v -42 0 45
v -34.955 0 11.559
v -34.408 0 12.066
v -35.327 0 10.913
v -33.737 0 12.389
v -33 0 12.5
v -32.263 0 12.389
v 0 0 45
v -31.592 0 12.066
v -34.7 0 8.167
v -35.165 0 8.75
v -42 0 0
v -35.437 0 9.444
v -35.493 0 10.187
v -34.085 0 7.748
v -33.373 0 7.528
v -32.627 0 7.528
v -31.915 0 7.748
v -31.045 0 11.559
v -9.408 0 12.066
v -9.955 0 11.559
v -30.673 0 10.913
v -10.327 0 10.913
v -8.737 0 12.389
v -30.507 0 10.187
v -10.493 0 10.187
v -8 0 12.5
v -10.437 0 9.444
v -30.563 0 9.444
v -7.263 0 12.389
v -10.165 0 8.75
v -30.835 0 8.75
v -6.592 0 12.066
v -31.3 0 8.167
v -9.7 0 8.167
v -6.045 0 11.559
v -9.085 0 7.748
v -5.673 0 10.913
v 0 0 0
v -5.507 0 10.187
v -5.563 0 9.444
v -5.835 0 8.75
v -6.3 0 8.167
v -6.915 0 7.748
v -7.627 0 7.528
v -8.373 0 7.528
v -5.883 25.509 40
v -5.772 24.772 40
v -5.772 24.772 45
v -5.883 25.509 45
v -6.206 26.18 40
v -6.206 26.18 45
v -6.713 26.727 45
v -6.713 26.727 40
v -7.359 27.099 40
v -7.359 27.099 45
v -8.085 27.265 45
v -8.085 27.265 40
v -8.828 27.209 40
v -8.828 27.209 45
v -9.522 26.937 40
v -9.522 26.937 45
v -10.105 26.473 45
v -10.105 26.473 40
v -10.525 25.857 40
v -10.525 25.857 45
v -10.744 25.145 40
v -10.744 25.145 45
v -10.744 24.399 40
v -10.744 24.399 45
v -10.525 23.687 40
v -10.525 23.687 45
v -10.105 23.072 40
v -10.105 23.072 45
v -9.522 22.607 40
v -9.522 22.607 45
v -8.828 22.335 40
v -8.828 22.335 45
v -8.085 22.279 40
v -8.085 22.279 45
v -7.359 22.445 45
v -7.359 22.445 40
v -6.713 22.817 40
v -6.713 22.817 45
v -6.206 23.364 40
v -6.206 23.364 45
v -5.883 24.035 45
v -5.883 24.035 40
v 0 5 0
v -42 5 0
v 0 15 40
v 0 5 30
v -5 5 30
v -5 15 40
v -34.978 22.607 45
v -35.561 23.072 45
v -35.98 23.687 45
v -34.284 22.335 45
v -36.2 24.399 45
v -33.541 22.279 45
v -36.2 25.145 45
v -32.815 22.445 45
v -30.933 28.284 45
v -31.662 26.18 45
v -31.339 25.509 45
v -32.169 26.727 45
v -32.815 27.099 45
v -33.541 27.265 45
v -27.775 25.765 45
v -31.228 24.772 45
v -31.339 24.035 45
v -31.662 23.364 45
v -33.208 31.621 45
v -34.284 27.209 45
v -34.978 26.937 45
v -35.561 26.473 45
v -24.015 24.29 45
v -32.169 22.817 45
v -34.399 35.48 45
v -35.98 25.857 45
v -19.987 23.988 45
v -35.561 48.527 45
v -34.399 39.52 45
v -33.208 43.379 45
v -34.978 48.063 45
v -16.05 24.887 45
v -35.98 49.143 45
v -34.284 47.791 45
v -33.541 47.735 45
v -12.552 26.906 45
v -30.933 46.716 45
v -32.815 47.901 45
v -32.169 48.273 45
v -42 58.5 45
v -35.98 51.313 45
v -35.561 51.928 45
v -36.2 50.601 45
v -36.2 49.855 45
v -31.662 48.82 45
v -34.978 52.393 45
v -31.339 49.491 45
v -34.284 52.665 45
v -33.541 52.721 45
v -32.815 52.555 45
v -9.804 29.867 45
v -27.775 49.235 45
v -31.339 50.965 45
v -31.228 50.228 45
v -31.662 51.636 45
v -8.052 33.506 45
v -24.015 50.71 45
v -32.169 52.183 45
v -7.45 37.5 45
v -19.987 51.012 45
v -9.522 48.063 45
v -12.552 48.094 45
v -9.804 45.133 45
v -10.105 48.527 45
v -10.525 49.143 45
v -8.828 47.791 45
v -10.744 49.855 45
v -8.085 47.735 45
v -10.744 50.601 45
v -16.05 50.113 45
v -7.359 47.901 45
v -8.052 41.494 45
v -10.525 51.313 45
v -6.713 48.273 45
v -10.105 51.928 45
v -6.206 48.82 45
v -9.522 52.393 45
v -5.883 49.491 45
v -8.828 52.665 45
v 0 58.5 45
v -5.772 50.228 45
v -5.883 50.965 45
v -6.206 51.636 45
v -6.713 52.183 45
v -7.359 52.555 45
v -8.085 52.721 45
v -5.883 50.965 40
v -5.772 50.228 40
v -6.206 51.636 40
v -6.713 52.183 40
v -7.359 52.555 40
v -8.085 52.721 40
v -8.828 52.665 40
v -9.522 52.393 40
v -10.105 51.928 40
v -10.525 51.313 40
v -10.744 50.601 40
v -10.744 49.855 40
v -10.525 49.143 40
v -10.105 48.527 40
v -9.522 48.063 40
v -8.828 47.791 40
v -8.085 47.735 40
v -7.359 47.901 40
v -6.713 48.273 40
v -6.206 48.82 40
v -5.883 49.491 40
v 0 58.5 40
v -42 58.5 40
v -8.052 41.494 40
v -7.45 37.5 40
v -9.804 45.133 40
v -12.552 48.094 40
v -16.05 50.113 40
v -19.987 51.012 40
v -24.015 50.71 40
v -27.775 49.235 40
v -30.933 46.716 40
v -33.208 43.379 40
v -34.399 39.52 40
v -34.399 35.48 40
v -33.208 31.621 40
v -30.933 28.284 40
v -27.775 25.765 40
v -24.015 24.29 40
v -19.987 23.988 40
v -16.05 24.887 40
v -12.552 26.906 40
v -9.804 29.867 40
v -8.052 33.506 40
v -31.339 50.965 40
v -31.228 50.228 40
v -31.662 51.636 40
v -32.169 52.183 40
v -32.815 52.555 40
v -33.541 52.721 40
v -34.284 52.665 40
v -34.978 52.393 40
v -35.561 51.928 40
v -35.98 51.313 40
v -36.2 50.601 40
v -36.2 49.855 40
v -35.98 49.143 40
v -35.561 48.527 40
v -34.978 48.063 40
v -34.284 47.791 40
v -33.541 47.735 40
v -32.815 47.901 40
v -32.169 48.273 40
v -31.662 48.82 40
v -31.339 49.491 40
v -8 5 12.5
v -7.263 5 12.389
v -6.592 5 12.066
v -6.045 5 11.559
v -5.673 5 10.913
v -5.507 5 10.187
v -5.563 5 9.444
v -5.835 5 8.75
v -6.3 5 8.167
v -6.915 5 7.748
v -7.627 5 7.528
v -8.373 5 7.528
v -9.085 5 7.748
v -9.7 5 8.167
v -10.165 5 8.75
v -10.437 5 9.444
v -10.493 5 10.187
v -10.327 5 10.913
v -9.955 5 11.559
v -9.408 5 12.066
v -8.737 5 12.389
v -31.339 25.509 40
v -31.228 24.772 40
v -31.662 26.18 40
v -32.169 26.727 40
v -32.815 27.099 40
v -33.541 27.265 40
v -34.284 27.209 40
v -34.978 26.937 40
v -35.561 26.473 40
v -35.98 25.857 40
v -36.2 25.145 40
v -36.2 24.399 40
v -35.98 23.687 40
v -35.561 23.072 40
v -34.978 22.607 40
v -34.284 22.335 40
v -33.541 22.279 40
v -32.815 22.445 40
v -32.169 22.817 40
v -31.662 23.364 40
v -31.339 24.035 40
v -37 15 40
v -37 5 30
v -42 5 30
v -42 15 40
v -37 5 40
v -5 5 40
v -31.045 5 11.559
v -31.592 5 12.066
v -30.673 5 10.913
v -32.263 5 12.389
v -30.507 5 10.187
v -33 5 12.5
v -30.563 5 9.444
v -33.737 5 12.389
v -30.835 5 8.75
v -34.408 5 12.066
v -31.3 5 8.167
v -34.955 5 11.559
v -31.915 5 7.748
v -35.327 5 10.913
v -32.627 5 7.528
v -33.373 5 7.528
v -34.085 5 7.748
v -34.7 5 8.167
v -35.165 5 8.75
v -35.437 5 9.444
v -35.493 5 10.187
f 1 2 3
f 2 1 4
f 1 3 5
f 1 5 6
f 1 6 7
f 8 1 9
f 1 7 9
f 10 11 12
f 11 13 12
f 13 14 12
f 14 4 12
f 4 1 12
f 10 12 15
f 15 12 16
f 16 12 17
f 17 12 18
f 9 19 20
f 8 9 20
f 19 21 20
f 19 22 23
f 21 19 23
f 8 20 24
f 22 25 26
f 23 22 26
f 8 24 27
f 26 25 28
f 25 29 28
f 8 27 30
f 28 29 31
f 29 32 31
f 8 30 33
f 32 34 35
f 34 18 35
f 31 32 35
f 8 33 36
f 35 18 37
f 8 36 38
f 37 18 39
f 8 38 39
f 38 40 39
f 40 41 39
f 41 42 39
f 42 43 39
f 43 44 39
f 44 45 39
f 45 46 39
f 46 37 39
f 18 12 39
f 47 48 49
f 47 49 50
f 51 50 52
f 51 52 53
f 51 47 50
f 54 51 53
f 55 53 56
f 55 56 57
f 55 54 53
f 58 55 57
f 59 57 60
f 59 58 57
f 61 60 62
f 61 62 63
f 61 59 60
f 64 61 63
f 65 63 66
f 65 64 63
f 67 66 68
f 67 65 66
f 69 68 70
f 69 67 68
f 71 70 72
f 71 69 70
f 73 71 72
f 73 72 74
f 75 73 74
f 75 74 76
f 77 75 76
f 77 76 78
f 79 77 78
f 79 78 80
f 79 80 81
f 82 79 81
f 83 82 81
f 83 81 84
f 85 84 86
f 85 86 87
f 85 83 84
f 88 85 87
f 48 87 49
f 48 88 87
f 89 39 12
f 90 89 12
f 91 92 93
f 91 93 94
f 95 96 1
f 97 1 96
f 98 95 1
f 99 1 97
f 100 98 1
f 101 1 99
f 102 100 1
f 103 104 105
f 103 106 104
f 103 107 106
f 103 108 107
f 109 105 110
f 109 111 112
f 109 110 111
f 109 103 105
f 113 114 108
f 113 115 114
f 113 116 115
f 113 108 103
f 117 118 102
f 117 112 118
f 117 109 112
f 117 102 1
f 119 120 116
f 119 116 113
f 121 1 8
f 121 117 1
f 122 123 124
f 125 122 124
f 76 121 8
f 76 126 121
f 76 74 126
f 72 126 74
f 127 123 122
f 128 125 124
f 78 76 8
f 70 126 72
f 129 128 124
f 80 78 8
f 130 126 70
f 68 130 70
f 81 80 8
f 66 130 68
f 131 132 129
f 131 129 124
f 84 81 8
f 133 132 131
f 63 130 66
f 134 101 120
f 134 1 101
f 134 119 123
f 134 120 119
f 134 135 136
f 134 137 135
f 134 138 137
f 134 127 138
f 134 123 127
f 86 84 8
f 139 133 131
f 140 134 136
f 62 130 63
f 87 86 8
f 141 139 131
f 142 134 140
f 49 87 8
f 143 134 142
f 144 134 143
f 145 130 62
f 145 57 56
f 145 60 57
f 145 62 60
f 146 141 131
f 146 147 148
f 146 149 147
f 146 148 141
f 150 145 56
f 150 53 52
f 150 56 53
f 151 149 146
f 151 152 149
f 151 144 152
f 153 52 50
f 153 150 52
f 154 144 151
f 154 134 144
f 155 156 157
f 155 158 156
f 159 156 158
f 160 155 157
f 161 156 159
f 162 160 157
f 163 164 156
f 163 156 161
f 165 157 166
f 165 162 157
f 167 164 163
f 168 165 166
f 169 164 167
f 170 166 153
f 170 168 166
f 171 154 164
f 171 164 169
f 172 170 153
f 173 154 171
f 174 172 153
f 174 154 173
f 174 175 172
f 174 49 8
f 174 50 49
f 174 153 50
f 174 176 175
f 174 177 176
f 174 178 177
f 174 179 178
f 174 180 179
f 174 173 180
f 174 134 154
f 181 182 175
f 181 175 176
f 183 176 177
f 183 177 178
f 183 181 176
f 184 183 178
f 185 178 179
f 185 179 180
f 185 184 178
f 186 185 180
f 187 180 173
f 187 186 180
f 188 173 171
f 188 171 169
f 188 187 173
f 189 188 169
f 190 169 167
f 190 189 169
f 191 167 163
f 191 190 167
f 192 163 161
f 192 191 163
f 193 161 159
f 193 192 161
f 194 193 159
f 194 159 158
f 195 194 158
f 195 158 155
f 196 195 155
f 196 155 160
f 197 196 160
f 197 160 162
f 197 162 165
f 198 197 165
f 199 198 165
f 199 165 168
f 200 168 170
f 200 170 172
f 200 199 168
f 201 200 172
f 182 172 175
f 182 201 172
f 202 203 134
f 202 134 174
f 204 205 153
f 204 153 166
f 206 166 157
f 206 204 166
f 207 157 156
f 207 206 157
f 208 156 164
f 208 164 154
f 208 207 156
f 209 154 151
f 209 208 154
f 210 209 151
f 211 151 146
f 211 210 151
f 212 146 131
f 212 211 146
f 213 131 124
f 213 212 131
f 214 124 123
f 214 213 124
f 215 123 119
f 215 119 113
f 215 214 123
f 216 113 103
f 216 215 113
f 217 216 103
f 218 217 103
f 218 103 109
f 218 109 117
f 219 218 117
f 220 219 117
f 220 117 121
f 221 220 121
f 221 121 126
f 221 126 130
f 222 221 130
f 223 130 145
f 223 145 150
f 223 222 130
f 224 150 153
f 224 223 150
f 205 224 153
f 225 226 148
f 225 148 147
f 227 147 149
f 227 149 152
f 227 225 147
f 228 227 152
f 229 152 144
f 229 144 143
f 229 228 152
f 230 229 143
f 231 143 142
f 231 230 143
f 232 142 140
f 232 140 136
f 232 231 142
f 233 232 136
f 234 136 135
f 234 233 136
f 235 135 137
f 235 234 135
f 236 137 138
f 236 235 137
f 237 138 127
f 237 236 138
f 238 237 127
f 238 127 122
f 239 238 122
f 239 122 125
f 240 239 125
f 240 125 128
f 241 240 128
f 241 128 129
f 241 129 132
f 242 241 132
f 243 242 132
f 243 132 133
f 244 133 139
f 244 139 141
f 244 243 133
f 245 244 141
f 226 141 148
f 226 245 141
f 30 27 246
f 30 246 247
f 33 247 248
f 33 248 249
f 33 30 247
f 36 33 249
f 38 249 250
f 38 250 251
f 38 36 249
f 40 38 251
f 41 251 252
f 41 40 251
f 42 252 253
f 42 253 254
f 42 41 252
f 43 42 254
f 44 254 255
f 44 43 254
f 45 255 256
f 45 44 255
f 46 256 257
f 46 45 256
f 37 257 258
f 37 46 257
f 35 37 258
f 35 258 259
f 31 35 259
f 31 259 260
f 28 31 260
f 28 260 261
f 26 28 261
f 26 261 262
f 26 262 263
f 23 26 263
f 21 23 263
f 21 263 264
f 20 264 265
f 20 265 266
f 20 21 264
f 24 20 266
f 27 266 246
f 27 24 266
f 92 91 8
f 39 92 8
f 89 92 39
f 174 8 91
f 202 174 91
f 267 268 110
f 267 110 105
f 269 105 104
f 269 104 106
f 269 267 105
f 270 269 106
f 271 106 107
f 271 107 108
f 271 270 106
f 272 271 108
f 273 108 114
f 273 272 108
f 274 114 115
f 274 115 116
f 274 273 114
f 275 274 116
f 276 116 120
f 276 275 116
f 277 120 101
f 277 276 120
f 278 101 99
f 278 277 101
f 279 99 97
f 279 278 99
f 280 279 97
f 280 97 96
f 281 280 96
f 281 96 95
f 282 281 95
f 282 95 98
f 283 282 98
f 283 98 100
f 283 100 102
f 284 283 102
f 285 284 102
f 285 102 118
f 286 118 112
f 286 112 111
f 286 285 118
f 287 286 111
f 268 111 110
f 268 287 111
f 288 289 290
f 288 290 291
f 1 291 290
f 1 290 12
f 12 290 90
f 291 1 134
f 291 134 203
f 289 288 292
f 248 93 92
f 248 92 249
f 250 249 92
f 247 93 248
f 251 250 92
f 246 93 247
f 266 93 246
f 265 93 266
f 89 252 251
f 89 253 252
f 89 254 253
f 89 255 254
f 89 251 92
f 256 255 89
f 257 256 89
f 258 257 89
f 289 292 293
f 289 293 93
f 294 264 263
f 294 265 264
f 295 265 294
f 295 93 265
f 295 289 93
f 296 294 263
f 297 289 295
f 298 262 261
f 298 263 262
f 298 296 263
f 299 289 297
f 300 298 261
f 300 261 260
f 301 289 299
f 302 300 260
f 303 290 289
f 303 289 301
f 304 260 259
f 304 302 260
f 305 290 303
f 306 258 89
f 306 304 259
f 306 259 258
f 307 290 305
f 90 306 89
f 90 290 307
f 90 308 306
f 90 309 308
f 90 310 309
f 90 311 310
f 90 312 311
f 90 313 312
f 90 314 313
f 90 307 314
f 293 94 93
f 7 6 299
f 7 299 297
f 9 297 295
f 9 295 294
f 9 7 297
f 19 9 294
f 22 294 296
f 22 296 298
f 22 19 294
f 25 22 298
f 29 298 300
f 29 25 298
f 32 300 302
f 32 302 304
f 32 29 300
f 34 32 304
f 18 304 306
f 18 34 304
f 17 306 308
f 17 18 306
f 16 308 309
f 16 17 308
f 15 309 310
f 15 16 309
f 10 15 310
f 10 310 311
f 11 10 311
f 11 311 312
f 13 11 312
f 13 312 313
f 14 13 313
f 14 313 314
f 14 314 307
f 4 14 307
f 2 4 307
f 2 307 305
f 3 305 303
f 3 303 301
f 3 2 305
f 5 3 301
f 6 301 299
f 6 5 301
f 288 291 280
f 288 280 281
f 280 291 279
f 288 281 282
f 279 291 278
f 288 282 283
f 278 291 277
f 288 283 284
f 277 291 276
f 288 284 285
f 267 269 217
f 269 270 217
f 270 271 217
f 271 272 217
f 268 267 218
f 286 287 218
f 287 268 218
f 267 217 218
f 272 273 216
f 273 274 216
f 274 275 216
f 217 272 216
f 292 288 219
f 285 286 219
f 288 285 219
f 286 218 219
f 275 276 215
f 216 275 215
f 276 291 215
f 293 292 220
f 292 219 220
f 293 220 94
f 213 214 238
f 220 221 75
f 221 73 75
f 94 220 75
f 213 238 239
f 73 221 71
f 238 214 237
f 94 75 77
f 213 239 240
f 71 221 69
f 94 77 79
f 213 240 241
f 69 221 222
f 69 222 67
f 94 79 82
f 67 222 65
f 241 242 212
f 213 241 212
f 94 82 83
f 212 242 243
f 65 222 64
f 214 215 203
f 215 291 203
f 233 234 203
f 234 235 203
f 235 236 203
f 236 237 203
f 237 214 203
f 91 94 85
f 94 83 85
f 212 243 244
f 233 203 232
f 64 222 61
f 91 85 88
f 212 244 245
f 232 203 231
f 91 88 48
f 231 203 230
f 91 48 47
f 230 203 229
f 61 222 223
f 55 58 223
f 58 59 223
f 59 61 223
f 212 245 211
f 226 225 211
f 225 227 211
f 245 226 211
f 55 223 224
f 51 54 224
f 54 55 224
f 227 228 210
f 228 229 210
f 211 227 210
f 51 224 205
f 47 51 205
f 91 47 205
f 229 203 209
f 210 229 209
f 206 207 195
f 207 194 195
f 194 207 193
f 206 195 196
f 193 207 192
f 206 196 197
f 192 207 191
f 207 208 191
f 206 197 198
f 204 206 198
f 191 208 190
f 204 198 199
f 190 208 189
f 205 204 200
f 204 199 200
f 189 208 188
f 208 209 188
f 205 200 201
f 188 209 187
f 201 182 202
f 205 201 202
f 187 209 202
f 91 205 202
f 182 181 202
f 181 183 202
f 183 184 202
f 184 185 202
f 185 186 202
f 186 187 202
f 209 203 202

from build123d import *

# Parameters (mm, degrees)
SKETCH_1_W             = 40
SKETCH_1_H             = 42
SKETCH_1_R             = 2.5
EXTRUDE_1_DEPTH        = 5
SKETCH_2_W             = 42
SKETCH_2_H             = 58.5
SKETCH_2_R             = 13.55
SKETCH_2_R_2           = 2.5
EXTRUDE_2_DEPTH        = 5
EXTRUDE_3_DEPTH        = 5
PATTERN_LINEAR_1_COUNT = 2
PATTERN_LINEAR_1_PITCH = 37


with BuildPart() as part:
    # 草图1 → 凸台-拉伸1 (new body)
    with BuildSketch(Plane(origin=(0, 0, 0), x_dir=(0, 0, -1), z_dir=(0, 1, 0))):
        with Locations((-20, 21)):
            Rectangle(SKETCH_1_W, SKETCH_1_H)
        with Locations(Location((-10, 33, 0), (0, 0, 180))):
            Circle(SKETCH_1_R, mode=Mode.SUBTRACT)
        with Locations(Location((-10, 8, 0), (0, 0, 180))):
            Circle(SKETCH_1_R, mode=Mode.SUBTRACT)
    extrude(amount=EXTRUDE_1_DEPTH)

    # 草图2 → 凸台-拉伸2 (add)
    with BuildSketch(Plane.XY.offset(40)):
        with Locations((-21, 29.25)):
            Rectangle(SKETCH_2_W, SKETCH_2_H)
        with Locations((-21, 37.5)):
            Circle(SKETCH_2_R, mode=Mode.SUBTRACT)
        with Locations((-33.727922061, 24.772077939)):
            Circle(SKETCH_2_R_2, mode=Mode.SUBTRACT)
        with Locations((-8.272077939, 50.227922061)):
            Circle(SKETCH_2_R_2, mode=Mode.SUBTRACT)
        with Locations((-33.727922061, 50.227922061)):
            Circle(SKETCH_2_R_2, mode=Mode.SUBTRACT)
        with Locations((-8.272077939, 24.772077939)):
            Circle(SKETCH_2_R_2, mode=Mode.SUBTRACT)
    extrude(amount=EXTRUDE_2_DEPTH)

    # 草图3 → 凸台-拉伸3 (add)
    with BuildSketch(Plane(origin=(0, 0, 0), x_dir=(0, 0, -1), z_dir=(1, 0, 0))):
        Polygon((-40, 15), (-40, 5), (-30, 5), align=None)
    extrude_3 = extrude(amount=-EXTRUDE_3_DEPTH)

    # 阵列(线性)1: 凸台-拉伸3 ×2
    with Locations(*[(-i * PATTERN_LINEAR_1_PITCH, 0, 0) for i in range(1, PATTERN_LINEAR_1_COUNT)]):
        add(extrude_3)


solid = part.part
